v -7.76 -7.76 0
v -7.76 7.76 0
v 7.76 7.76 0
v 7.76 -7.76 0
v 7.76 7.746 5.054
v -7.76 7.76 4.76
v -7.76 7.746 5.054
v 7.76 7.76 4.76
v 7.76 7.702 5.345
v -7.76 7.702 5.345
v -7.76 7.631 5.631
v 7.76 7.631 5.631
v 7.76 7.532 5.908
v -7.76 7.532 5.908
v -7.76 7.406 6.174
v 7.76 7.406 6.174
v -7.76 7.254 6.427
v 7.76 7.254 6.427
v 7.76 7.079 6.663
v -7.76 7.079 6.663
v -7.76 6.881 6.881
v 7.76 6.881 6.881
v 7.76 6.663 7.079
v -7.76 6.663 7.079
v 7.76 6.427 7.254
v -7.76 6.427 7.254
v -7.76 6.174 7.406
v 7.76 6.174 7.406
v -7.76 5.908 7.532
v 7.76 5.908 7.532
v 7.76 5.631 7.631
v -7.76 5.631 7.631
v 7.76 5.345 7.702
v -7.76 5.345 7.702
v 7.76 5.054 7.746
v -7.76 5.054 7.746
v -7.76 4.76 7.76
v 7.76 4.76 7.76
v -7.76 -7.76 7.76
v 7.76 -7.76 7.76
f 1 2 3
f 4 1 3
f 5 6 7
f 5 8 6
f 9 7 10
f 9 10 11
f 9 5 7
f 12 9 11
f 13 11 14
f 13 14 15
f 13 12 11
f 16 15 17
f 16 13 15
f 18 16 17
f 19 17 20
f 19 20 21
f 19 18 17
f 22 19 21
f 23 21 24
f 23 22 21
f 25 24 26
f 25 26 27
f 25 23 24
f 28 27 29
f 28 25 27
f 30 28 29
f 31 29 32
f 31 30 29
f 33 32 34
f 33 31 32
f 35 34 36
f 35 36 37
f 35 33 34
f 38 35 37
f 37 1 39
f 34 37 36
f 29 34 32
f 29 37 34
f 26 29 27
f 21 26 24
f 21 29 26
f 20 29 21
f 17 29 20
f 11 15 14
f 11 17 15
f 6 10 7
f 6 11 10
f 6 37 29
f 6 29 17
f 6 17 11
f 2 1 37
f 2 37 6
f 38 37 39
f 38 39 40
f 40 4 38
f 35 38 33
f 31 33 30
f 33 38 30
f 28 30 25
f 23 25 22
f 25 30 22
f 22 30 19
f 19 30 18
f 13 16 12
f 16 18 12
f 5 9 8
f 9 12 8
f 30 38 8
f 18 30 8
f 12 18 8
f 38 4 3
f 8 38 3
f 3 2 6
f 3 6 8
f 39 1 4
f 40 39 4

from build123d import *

# Parameters (mm, degrees)
ESQUISSE1_W        = 15.52
ESQUISSE1_H        = 15.52
BOSS_EXTRU_1_DEPTH = 7.76
CONG_1_R           = 3


with BuildPart() as part:
    # Esquisse1 → Boss.-Extru.1 (new body)
    with BuildSketch(Plane.XY):
        Rectangle(ESQUISSE1_W, ESQUISSE1_H)
    extrude(amount=BOSS_EXTRU_1_DEPTH)

    # Congé1
    cong_1_edges = [part.edges().sort_by_distance(p)[0] for p in [
        (0, 7.76, 7.76),
    ]]
    fillet(cong_1_edges, radius=CONG_1_R)


solid = part.part
